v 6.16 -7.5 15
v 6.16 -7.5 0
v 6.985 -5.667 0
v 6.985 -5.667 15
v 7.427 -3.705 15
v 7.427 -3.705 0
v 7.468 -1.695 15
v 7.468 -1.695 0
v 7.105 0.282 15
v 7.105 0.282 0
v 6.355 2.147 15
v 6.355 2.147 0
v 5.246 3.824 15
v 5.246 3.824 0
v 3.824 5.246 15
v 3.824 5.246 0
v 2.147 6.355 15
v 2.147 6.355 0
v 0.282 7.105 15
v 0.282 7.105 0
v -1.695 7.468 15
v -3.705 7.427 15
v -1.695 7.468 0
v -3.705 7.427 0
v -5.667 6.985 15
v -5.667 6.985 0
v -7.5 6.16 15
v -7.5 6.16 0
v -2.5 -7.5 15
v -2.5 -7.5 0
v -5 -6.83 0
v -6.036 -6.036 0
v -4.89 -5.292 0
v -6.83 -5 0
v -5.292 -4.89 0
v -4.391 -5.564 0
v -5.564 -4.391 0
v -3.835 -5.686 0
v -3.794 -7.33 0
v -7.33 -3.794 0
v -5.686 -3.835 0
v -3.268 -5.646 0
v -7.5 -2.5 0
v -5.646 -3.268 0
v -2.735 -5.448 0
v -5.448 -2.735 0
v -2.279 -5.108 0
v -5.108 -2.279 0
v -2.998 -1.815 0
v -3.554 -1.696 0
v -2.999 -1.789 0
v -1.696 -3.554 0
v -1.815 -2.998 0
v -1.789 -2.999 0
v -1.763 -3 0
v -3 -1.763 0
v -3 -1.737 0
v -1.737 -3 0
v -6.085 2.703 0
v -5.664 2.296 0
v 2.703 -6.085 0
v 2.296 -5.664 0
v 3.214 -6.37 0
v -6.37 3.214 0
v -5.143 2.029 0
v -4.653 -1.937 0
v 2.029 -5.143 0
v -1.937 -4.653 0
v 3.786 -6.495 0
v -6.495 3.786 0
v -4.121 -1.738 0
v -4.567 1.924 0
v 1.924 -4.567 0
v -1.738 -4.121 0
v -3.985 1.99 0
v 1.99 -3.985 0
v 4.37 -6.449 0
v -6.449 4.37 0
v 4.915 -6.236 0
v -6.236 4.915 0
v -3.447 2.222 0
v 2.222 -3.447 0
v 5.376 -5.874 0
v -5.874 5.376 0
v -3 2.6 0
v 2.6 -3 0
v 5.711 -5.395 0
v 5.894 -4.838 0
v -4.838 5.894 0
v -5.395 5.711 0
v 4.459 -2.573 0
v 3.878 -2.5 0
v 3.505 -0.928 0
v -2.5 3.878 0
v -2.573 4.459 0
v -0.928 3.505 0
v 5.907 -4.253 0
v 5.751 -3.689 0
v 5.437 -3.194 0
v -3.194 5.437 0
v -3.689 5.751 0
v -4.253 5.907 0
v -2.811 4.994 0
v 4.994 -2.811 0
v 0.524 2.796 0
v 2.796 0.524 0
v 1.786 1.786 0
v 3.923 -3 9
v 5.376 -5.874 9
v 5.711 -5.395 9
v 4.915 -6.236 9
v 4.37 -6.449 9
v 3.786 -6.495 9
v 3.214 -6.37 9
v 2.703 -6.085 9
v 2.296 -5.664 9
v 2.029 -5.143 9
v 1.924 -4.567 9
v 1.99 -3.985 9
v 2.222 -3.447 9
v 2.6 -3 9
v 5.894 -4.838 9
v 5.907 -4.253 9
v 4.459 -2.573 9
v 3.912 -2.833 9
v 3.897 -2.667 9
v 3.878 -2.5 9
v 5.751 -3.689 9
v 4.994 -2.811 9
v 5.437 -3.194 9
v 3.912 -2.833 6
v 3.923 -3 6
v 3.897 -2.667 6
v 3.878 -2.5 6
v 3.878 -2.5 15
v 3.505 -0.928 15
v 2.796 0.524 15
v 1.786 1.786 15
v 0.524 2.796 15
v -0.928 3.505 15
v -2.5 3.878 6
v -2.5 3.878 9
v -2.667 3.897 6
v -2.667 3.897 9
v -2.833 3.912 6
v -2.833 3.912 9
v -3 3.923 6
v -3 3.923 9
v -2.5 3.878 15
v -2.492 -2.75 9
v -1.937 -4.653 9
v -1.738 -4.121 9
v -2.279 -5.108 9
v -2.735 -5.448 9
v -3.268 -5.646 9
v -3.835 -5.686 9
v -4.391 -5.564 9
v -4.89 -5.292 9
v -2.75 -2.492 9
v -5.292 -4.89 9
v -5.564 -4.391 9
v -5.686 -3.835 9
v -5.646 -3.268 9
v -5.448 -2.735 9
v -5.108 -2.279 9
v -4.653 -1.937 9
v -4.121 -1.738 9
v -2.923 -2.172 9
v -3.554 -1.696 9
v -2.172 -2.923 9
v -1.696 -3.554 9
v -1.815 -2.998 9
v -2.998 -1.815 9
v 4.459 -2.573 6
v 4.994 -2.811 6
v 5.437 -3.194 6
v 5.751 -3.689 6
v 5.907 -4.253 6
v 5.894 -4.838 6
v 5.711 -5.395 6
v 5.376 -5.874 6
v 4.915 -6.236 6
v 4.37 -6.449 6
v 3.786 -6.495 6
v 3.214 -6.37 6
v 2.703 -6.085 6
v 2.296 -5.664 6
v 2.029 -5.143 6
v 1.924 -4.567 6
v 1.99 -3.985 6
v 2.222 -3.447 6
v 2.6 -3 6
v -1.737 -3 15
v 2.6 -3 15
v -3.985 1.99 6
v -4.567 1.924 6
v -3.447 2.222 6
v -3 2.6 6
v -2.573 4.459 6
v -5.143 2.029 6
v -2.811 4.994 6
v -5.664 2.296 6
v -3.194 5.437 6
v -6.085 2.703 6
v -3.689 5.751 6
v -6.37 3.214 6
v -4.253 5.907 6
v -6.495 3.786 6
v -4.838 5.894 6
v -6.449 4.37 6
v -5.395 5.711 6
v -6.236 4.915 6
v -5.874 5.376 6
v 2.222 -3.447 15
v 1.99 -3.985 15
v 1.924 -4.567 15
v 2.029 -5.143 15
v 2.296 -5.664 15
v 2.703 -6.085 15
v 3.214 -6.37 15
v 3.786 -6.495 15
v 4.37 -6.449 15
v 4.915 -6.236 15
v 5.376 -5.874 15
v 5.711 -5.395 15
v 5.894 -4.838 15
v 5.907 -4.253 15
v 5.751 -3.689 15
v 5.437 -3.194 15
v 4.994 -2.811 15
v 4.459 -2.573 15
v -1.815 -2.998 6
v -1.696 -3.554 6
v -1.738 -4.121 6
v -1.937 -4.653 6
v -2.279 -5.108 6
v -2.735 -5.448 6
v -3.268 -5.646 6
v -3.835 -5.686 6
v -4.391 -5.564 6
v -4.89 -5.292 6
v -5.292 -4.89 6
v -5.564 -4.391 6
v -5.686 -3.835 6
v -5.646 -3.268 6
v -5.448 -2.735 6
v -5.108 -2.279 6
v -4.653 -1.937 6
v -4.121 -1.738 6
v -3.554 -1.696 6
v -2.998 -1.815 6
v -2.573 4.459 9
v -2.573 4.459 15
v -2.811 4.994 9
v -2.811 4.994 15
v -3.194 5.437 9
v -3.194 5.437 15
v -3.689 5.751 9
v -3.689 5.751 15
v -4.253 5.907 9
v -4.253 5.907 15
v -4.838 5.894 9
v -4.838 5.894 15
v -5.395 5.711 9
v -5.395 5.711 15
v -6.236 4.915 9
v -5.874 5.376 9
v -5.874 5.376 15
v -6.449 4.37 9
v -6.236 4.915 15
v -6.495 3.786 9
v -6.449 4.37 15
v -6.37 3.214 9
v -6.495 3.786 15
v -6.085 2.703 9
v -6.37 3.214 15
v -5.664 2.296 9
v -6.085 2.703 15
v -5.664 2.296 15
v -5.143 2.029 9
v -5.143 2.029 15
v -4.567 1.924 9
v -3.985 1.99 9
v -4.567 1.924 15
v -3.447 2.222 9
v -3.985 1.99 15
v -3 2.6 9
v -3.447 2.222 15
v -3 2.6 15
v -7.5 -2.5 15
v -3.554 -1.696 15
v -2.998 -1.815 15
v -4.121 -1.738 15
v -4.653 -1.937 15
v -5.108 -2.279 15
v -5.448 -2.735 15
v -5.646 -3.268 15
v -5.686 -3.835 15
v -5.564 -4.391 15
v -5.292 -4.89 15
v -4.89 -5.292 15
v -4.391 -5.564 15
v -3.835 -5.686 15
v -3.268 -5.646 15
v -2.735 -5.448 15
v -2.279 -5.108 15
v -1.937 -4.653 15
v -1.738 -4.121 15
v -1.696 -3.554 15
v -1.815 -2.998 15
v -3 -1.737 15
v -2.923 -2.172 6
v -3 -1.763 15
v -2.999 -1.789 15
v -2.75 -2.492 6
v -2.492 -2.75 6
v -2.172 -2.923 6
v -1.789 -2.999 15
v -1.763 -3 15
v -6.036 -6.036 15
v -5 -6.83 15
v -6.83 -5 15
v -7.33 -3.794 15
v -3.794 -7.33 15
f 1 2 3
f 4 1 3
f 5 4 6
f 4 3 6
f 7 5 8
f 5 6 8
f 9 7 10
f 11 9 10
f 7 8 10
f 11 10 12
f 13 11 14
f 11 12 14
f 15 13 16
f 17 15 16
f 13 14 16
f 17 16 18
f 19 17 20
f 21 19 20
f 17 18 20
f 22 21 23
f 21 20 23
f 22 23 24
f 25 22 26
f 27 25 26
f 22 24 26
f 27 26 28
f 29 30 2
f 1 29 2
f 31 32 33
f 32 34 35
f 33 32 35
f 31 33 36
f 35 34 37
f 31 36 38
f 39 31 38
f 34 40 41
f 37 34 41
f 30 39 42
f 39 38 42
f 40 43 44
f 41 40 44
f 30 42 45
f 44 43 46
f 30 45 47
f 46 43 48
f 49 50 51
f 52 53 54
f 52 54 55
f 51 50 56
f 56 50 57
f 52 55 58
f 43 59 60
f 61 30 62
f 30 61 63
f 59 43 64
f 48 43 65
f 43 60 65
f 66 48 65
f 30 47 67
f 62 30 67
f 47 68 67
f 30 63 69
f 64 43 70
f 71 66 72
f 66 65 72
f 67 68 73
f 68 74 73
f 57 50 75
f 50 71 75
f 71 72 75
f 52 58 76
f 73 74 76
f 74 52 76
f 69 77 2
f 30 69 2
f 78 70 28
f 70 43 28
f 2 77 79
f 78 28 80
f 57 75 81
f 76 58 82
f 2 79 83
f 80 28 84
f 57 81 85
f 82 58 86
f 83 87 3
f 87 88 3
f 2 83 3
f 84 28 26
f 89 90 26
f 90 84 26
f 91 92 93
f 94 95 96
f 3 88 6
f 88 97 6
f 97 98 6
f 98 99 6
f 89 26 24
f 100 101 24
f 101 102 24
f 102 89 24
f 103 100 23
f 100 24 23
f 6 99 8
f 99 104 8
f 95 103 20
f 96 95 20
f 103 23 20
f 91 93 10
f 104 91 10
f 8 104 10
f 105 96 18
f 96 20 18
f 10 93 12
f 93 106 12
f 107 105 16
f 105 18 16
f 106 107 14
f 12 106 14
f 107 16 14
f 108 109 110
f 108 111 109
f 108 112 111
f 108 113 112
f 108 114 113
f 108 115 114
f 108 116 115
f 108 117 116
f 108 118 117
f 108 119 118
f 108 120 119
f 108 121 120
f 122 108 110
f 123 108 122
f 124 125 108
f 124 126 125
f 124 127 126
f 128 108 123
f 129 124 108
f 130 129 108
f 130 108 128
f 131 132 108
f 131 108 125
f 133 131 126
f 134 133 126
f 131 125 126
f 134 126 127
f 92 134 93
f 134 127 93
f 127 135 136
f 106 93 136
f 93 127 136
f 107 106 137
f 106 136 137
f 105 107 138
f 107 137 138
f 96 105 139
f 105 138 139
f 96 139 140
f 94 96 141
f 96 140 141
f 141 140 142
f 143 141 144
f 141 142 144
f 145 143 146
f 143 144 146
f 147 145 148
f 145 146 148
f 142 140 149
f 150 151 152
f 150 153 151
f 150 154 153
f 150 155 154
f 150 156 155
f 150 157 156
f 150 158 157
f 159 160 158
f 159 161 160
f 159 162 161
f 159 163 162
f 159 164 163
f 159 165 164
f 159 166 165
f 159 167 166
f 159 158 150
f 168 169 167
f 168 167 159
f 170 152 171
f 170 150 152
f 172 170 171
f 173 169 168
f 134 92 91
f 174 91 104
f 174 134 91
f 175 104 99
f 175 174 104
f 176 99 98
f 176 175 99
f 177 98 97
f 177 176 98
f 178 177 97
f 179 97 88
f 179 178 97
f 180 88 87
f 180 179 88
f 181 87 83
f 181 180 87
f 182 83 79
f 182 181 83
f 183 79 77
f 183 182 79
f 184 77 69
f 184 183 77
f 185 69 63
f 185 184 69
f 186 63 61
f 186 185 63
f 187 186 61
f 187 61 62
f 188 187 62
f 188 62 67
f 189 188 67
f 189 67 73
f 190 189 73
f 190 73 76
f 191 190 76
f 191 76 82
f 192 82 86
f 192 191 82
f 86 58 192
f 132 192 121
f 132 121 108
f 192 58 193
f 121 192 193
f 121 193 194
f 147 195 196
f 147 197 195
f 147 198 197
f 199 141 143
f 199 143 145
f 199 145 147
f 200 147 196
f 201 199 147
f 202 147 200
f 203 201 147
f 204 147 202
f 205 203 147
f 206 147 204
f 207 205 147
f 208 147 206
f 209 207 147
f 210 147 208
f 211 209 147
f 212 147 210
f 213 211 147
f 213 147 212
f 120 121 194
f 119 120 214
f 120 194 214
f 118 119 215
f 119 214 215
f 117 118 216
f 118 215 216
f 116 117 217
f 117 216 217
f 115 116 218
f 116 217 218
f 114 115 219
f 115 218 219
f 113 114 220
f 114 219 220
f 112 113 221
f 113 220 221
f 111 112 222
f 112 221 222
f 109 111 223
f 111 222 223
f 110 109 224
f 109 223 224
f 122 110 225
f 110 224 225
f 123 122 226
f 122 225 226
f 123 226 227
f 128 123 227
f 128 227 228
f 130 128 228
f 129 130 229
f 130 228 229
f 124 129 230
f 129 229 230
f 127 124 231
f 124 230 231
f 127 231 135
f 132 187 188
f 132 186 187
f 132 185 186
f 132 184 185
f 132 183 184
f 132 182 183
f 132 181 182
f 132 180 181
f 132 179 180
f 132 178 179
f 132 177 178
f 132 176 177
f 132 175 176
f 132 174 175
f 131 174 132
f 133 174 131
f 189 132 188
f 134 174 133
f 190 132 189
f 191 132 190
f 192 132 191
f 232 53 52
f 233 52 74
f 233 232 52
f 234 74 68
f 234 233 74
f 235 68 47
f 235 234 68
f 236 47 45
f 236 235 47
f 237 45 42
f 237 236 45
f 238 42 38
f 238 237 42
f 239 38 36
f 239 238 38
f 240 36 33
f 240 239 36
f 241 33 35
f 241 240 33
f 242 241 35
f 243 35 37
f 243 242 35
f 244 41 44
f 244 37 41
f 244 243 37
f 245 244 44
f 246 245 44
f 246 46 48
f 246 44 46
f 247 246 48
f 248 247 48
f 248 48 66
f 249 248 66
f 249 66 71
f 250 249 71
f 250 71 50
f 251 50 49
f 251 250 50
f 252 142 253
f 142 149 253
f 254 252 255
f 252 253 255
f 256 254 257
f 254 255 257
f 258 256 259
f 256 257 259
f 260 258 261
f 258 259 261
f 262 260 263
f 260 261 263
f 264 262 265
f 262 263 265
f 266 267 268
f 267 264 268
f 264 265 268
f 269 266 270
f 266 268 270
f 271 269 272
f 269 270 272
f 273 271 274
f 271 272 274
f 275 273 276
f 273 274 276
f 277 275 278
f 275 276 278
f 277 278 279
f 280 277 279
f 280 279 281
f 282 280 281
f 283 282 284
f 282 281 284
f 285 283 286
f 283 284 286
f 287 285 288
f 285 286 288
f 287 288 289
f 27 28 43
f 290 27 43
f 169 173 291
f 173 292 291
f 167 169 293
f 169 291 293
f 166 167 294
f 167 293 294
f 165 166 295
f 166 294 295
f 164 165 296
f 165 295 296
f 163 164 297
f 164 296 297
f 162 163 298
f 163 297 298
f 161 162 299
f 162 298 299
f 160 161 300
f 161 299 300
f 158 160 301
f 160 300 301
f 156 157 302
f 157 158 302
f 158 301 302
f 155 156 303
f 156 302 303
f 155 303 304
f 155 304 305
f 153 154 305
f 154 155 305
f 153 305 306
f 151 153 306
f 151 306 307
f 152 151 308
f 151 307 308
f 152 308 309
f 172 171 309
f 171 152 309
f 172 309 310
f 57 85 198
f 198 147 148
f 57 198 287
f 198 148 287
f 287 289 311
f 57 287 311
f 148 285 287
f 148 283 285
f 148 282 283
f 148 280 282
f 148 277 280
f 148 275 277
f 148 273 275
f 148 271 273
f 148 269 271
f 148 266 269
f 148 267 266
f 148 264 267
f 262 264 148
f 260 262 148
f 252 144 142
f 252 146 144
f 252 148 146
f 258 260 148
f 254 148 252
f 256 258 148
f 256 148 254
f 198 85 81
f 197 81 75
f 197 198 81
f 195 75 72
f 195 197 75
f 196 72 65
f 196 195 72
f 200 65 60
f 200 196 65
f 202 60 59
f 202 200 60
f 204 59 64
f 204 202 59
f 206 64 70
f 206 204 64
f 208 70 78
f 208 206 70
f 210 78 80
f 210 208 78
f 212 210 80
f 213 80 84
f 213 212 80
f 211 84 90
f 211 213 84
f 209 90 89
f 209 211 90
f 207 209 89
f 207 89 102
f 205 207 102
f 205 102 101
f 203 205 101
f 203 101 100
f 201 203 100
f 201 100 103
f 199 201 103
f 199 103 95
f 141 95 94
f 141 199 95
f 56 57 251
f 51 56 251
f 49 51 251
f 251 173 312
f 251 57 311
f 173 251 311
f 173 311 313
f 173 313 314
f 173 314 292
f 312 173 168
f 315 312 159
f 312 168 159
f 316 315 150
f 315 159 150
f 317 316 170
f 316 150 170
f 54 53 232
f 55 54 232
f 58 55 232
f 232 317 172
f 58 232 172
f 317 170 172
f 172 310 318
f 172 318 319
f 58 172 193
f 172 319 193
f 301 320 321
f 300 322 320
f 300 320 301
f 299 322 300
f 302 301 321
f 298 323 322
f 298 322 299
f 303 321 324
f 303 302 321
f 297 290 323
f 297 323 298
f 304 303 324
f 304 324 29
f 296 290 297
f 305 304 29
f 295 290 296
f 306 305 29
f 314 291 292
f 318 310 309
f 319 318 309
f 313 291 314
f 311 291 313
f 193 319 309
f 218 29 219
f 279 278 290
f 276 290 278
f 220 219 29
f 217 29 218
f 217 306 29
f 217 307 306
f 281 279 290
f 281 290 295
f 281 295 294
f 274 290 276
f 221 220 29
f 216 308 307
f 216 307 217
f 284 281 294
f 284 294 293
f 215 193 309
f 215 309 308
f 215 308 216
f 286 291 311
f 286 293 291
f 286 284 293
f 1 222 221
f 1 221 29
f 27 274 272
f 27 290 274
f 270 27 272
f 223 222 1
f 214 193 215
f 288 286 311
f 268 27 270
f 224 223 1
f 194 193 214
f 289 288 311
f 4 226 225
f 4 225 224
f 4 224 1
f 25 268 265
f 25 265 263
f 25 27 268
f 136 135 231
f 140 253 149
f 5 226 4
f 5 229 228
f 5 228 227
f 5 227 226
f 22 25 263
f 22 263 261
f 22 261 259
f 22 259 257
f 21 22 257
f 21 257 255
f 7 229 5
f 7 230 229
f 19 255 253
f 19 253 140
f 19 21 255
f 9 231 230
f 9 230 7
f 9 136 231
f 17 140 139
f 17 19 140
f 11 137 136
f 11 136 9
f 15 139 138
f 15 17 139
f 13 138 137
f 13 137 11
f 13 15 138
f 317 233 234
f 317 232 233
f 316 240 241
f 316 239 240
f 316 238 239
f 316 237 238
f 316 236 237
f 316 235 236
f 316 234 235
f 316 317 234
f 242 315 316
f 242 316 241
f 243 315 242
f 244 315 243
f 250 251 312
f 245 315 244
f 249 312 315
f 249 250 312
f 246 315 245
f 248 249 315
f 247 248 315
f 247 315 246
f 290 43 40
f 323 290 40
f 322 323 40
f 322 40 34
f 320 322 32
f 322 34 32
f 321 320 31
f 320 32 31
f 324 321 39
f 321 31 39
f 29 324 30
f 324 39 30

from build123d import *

# Parameters (mm, degrees)
RESSALTO_EXTRUS_O1_DEPTH = 15
CORTE_EXTRUS_O1_DEPTH    = 240
ESBO_O4_R                = 2
CORTE_EXTRUS_O3_DEPTH    = 6
CORTE_EXTRUS_O4_START    = -6
ESBO_O6_R                = 2
CORTE_EXTRUS_O4_DEPTH    = 6


with BuildPart() as part:
    # Esboço1 → Ressalto-extrusão1 (new body)
    with BuildSketch(Plane.XY):
        with BuildLine():
            Line((-7.5, 6.160254038), (-7.5, -2.5))
            ThreePointArc((-7.5, -2.5), (-6.035533906, -6.035533906), (-2.5, -7.5))
            Line((-2.5, -7.5), (6.160254038, -7.5))
            ThreePointArc((6.160254038, -7.5), (4.571067812, 4.571067812), (-7.5, 6.160254038))
        make_face()
    extrude(amount=RESSALTO_EXTRUS_O1_DEPTH)

    # Esboço2 → Corte-extrusão1 (cut)
    with BuildSketch(Plane.XY.offset(15)):
        with BuildLine():
            Line((-3, 3.922616289), (-3, -1.737383711))
            ThreePointArc((-3, -1.737383711), (-2.630188251, -2.630188251), (-1.737383711, -3))
            Line((-1.737383711, -3), (3.922616289, -3))
            ThreePointArc((3.922616289, -3), (1.78599112, 1.78599112), (-3, 3.922616289))
        make_face()
    extrude(amount=-CORTE_EXTRUS_O1_DEPTH, mode=Mode.SUBTRACT)

    # Esboço4 → Corte-extrusão3 (cut)
    with BuildSketch(Plane.XY.offset(15)):
        with Locations((-3.690848423, -3.690848423)):
            Circle(ESBO_O4_R)
        with Locations((-4.5, 3.922616289)):
            Circle(ESBO_O4_R)
        with Locations((3.922616289, -4.5)):
            Circle(ESBO_O4_R)
    extrude(amount=-CORTE_EXTRUS_O3_DEPTH, mode=Mode.SUBTRACT)

    # Esboço6 → Corte-extrusão4 (cut)
    with BuildSketch(Plane(origin=(0, 0, 0), x_dir=(-1, 0, 0), z_dir=(0, 0, -1)).offset(CORTE_EXTRUS_O4_START)):
        with Locations((4.5, 3.922616289)):
            Circle(ESBO_O6_R)
        with Locations((-3.922616289, -4.5)):
            Circle(ESBO_O6_R)
        with Locations((3.690848423, -3.690848423)):
            Circle(ESBO_O6_R)
    extrude(amount=CORTE_EXTRUS_O4_DEPTH, mode=Mode.SUBTRACT)


solid = part.part
